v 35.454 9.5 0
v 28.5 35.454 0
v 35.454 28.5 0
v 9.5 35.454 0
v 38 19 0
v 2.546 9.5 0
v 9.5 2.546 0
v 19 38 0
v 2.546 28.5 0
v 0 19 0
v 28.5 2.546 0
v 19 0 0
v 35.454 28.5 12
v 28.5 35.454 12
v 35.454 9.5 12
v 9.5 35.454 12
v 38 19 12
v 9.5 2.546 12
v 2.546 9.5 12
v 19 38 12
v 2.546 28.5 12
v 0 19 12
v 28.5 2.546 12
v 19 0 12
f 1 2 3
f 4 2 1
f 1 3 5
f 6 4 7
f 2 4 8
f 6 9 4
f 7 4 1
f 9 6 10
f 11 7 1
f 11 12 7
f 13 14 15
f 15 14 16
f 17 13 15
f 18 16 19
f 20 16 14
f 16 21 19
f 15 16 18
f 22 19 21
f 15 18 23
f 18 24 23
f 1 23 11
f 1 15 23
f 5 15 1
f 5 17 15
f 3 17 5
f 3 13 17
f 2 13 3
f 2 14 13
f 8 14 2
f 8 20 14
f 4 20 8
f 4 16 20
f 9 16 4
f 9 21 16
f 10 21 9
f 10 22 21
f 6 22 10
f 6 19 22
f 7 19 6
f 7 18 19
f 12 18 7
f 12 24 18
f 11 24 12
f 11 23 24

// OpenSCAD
$fn = 32;

// ----------------------------------------------------------------------
// Eccentric disc: egg, 12 mm thick
// ----------------------------------------------------------------------

// --- parameters (mm) ---
profile_height = 12;      // extrusion height
profile_points = 12;      // points of the closed outline

profile = [[0, 19], [2.546, 9.5], [9.5, 2.546], [19, 0], [28.5, 2.546], [35.454, 9.5], [38, 19], [35.454, 28.5], [28.5, 35.454], [19, 38], [9.5, 35.454], [2.546, 28.5]];  // single closed polygon, 12 points, counter clockwise

// --- the one profile operation ---
linear_extrude(height = profile_height) polygon(points = profile);
